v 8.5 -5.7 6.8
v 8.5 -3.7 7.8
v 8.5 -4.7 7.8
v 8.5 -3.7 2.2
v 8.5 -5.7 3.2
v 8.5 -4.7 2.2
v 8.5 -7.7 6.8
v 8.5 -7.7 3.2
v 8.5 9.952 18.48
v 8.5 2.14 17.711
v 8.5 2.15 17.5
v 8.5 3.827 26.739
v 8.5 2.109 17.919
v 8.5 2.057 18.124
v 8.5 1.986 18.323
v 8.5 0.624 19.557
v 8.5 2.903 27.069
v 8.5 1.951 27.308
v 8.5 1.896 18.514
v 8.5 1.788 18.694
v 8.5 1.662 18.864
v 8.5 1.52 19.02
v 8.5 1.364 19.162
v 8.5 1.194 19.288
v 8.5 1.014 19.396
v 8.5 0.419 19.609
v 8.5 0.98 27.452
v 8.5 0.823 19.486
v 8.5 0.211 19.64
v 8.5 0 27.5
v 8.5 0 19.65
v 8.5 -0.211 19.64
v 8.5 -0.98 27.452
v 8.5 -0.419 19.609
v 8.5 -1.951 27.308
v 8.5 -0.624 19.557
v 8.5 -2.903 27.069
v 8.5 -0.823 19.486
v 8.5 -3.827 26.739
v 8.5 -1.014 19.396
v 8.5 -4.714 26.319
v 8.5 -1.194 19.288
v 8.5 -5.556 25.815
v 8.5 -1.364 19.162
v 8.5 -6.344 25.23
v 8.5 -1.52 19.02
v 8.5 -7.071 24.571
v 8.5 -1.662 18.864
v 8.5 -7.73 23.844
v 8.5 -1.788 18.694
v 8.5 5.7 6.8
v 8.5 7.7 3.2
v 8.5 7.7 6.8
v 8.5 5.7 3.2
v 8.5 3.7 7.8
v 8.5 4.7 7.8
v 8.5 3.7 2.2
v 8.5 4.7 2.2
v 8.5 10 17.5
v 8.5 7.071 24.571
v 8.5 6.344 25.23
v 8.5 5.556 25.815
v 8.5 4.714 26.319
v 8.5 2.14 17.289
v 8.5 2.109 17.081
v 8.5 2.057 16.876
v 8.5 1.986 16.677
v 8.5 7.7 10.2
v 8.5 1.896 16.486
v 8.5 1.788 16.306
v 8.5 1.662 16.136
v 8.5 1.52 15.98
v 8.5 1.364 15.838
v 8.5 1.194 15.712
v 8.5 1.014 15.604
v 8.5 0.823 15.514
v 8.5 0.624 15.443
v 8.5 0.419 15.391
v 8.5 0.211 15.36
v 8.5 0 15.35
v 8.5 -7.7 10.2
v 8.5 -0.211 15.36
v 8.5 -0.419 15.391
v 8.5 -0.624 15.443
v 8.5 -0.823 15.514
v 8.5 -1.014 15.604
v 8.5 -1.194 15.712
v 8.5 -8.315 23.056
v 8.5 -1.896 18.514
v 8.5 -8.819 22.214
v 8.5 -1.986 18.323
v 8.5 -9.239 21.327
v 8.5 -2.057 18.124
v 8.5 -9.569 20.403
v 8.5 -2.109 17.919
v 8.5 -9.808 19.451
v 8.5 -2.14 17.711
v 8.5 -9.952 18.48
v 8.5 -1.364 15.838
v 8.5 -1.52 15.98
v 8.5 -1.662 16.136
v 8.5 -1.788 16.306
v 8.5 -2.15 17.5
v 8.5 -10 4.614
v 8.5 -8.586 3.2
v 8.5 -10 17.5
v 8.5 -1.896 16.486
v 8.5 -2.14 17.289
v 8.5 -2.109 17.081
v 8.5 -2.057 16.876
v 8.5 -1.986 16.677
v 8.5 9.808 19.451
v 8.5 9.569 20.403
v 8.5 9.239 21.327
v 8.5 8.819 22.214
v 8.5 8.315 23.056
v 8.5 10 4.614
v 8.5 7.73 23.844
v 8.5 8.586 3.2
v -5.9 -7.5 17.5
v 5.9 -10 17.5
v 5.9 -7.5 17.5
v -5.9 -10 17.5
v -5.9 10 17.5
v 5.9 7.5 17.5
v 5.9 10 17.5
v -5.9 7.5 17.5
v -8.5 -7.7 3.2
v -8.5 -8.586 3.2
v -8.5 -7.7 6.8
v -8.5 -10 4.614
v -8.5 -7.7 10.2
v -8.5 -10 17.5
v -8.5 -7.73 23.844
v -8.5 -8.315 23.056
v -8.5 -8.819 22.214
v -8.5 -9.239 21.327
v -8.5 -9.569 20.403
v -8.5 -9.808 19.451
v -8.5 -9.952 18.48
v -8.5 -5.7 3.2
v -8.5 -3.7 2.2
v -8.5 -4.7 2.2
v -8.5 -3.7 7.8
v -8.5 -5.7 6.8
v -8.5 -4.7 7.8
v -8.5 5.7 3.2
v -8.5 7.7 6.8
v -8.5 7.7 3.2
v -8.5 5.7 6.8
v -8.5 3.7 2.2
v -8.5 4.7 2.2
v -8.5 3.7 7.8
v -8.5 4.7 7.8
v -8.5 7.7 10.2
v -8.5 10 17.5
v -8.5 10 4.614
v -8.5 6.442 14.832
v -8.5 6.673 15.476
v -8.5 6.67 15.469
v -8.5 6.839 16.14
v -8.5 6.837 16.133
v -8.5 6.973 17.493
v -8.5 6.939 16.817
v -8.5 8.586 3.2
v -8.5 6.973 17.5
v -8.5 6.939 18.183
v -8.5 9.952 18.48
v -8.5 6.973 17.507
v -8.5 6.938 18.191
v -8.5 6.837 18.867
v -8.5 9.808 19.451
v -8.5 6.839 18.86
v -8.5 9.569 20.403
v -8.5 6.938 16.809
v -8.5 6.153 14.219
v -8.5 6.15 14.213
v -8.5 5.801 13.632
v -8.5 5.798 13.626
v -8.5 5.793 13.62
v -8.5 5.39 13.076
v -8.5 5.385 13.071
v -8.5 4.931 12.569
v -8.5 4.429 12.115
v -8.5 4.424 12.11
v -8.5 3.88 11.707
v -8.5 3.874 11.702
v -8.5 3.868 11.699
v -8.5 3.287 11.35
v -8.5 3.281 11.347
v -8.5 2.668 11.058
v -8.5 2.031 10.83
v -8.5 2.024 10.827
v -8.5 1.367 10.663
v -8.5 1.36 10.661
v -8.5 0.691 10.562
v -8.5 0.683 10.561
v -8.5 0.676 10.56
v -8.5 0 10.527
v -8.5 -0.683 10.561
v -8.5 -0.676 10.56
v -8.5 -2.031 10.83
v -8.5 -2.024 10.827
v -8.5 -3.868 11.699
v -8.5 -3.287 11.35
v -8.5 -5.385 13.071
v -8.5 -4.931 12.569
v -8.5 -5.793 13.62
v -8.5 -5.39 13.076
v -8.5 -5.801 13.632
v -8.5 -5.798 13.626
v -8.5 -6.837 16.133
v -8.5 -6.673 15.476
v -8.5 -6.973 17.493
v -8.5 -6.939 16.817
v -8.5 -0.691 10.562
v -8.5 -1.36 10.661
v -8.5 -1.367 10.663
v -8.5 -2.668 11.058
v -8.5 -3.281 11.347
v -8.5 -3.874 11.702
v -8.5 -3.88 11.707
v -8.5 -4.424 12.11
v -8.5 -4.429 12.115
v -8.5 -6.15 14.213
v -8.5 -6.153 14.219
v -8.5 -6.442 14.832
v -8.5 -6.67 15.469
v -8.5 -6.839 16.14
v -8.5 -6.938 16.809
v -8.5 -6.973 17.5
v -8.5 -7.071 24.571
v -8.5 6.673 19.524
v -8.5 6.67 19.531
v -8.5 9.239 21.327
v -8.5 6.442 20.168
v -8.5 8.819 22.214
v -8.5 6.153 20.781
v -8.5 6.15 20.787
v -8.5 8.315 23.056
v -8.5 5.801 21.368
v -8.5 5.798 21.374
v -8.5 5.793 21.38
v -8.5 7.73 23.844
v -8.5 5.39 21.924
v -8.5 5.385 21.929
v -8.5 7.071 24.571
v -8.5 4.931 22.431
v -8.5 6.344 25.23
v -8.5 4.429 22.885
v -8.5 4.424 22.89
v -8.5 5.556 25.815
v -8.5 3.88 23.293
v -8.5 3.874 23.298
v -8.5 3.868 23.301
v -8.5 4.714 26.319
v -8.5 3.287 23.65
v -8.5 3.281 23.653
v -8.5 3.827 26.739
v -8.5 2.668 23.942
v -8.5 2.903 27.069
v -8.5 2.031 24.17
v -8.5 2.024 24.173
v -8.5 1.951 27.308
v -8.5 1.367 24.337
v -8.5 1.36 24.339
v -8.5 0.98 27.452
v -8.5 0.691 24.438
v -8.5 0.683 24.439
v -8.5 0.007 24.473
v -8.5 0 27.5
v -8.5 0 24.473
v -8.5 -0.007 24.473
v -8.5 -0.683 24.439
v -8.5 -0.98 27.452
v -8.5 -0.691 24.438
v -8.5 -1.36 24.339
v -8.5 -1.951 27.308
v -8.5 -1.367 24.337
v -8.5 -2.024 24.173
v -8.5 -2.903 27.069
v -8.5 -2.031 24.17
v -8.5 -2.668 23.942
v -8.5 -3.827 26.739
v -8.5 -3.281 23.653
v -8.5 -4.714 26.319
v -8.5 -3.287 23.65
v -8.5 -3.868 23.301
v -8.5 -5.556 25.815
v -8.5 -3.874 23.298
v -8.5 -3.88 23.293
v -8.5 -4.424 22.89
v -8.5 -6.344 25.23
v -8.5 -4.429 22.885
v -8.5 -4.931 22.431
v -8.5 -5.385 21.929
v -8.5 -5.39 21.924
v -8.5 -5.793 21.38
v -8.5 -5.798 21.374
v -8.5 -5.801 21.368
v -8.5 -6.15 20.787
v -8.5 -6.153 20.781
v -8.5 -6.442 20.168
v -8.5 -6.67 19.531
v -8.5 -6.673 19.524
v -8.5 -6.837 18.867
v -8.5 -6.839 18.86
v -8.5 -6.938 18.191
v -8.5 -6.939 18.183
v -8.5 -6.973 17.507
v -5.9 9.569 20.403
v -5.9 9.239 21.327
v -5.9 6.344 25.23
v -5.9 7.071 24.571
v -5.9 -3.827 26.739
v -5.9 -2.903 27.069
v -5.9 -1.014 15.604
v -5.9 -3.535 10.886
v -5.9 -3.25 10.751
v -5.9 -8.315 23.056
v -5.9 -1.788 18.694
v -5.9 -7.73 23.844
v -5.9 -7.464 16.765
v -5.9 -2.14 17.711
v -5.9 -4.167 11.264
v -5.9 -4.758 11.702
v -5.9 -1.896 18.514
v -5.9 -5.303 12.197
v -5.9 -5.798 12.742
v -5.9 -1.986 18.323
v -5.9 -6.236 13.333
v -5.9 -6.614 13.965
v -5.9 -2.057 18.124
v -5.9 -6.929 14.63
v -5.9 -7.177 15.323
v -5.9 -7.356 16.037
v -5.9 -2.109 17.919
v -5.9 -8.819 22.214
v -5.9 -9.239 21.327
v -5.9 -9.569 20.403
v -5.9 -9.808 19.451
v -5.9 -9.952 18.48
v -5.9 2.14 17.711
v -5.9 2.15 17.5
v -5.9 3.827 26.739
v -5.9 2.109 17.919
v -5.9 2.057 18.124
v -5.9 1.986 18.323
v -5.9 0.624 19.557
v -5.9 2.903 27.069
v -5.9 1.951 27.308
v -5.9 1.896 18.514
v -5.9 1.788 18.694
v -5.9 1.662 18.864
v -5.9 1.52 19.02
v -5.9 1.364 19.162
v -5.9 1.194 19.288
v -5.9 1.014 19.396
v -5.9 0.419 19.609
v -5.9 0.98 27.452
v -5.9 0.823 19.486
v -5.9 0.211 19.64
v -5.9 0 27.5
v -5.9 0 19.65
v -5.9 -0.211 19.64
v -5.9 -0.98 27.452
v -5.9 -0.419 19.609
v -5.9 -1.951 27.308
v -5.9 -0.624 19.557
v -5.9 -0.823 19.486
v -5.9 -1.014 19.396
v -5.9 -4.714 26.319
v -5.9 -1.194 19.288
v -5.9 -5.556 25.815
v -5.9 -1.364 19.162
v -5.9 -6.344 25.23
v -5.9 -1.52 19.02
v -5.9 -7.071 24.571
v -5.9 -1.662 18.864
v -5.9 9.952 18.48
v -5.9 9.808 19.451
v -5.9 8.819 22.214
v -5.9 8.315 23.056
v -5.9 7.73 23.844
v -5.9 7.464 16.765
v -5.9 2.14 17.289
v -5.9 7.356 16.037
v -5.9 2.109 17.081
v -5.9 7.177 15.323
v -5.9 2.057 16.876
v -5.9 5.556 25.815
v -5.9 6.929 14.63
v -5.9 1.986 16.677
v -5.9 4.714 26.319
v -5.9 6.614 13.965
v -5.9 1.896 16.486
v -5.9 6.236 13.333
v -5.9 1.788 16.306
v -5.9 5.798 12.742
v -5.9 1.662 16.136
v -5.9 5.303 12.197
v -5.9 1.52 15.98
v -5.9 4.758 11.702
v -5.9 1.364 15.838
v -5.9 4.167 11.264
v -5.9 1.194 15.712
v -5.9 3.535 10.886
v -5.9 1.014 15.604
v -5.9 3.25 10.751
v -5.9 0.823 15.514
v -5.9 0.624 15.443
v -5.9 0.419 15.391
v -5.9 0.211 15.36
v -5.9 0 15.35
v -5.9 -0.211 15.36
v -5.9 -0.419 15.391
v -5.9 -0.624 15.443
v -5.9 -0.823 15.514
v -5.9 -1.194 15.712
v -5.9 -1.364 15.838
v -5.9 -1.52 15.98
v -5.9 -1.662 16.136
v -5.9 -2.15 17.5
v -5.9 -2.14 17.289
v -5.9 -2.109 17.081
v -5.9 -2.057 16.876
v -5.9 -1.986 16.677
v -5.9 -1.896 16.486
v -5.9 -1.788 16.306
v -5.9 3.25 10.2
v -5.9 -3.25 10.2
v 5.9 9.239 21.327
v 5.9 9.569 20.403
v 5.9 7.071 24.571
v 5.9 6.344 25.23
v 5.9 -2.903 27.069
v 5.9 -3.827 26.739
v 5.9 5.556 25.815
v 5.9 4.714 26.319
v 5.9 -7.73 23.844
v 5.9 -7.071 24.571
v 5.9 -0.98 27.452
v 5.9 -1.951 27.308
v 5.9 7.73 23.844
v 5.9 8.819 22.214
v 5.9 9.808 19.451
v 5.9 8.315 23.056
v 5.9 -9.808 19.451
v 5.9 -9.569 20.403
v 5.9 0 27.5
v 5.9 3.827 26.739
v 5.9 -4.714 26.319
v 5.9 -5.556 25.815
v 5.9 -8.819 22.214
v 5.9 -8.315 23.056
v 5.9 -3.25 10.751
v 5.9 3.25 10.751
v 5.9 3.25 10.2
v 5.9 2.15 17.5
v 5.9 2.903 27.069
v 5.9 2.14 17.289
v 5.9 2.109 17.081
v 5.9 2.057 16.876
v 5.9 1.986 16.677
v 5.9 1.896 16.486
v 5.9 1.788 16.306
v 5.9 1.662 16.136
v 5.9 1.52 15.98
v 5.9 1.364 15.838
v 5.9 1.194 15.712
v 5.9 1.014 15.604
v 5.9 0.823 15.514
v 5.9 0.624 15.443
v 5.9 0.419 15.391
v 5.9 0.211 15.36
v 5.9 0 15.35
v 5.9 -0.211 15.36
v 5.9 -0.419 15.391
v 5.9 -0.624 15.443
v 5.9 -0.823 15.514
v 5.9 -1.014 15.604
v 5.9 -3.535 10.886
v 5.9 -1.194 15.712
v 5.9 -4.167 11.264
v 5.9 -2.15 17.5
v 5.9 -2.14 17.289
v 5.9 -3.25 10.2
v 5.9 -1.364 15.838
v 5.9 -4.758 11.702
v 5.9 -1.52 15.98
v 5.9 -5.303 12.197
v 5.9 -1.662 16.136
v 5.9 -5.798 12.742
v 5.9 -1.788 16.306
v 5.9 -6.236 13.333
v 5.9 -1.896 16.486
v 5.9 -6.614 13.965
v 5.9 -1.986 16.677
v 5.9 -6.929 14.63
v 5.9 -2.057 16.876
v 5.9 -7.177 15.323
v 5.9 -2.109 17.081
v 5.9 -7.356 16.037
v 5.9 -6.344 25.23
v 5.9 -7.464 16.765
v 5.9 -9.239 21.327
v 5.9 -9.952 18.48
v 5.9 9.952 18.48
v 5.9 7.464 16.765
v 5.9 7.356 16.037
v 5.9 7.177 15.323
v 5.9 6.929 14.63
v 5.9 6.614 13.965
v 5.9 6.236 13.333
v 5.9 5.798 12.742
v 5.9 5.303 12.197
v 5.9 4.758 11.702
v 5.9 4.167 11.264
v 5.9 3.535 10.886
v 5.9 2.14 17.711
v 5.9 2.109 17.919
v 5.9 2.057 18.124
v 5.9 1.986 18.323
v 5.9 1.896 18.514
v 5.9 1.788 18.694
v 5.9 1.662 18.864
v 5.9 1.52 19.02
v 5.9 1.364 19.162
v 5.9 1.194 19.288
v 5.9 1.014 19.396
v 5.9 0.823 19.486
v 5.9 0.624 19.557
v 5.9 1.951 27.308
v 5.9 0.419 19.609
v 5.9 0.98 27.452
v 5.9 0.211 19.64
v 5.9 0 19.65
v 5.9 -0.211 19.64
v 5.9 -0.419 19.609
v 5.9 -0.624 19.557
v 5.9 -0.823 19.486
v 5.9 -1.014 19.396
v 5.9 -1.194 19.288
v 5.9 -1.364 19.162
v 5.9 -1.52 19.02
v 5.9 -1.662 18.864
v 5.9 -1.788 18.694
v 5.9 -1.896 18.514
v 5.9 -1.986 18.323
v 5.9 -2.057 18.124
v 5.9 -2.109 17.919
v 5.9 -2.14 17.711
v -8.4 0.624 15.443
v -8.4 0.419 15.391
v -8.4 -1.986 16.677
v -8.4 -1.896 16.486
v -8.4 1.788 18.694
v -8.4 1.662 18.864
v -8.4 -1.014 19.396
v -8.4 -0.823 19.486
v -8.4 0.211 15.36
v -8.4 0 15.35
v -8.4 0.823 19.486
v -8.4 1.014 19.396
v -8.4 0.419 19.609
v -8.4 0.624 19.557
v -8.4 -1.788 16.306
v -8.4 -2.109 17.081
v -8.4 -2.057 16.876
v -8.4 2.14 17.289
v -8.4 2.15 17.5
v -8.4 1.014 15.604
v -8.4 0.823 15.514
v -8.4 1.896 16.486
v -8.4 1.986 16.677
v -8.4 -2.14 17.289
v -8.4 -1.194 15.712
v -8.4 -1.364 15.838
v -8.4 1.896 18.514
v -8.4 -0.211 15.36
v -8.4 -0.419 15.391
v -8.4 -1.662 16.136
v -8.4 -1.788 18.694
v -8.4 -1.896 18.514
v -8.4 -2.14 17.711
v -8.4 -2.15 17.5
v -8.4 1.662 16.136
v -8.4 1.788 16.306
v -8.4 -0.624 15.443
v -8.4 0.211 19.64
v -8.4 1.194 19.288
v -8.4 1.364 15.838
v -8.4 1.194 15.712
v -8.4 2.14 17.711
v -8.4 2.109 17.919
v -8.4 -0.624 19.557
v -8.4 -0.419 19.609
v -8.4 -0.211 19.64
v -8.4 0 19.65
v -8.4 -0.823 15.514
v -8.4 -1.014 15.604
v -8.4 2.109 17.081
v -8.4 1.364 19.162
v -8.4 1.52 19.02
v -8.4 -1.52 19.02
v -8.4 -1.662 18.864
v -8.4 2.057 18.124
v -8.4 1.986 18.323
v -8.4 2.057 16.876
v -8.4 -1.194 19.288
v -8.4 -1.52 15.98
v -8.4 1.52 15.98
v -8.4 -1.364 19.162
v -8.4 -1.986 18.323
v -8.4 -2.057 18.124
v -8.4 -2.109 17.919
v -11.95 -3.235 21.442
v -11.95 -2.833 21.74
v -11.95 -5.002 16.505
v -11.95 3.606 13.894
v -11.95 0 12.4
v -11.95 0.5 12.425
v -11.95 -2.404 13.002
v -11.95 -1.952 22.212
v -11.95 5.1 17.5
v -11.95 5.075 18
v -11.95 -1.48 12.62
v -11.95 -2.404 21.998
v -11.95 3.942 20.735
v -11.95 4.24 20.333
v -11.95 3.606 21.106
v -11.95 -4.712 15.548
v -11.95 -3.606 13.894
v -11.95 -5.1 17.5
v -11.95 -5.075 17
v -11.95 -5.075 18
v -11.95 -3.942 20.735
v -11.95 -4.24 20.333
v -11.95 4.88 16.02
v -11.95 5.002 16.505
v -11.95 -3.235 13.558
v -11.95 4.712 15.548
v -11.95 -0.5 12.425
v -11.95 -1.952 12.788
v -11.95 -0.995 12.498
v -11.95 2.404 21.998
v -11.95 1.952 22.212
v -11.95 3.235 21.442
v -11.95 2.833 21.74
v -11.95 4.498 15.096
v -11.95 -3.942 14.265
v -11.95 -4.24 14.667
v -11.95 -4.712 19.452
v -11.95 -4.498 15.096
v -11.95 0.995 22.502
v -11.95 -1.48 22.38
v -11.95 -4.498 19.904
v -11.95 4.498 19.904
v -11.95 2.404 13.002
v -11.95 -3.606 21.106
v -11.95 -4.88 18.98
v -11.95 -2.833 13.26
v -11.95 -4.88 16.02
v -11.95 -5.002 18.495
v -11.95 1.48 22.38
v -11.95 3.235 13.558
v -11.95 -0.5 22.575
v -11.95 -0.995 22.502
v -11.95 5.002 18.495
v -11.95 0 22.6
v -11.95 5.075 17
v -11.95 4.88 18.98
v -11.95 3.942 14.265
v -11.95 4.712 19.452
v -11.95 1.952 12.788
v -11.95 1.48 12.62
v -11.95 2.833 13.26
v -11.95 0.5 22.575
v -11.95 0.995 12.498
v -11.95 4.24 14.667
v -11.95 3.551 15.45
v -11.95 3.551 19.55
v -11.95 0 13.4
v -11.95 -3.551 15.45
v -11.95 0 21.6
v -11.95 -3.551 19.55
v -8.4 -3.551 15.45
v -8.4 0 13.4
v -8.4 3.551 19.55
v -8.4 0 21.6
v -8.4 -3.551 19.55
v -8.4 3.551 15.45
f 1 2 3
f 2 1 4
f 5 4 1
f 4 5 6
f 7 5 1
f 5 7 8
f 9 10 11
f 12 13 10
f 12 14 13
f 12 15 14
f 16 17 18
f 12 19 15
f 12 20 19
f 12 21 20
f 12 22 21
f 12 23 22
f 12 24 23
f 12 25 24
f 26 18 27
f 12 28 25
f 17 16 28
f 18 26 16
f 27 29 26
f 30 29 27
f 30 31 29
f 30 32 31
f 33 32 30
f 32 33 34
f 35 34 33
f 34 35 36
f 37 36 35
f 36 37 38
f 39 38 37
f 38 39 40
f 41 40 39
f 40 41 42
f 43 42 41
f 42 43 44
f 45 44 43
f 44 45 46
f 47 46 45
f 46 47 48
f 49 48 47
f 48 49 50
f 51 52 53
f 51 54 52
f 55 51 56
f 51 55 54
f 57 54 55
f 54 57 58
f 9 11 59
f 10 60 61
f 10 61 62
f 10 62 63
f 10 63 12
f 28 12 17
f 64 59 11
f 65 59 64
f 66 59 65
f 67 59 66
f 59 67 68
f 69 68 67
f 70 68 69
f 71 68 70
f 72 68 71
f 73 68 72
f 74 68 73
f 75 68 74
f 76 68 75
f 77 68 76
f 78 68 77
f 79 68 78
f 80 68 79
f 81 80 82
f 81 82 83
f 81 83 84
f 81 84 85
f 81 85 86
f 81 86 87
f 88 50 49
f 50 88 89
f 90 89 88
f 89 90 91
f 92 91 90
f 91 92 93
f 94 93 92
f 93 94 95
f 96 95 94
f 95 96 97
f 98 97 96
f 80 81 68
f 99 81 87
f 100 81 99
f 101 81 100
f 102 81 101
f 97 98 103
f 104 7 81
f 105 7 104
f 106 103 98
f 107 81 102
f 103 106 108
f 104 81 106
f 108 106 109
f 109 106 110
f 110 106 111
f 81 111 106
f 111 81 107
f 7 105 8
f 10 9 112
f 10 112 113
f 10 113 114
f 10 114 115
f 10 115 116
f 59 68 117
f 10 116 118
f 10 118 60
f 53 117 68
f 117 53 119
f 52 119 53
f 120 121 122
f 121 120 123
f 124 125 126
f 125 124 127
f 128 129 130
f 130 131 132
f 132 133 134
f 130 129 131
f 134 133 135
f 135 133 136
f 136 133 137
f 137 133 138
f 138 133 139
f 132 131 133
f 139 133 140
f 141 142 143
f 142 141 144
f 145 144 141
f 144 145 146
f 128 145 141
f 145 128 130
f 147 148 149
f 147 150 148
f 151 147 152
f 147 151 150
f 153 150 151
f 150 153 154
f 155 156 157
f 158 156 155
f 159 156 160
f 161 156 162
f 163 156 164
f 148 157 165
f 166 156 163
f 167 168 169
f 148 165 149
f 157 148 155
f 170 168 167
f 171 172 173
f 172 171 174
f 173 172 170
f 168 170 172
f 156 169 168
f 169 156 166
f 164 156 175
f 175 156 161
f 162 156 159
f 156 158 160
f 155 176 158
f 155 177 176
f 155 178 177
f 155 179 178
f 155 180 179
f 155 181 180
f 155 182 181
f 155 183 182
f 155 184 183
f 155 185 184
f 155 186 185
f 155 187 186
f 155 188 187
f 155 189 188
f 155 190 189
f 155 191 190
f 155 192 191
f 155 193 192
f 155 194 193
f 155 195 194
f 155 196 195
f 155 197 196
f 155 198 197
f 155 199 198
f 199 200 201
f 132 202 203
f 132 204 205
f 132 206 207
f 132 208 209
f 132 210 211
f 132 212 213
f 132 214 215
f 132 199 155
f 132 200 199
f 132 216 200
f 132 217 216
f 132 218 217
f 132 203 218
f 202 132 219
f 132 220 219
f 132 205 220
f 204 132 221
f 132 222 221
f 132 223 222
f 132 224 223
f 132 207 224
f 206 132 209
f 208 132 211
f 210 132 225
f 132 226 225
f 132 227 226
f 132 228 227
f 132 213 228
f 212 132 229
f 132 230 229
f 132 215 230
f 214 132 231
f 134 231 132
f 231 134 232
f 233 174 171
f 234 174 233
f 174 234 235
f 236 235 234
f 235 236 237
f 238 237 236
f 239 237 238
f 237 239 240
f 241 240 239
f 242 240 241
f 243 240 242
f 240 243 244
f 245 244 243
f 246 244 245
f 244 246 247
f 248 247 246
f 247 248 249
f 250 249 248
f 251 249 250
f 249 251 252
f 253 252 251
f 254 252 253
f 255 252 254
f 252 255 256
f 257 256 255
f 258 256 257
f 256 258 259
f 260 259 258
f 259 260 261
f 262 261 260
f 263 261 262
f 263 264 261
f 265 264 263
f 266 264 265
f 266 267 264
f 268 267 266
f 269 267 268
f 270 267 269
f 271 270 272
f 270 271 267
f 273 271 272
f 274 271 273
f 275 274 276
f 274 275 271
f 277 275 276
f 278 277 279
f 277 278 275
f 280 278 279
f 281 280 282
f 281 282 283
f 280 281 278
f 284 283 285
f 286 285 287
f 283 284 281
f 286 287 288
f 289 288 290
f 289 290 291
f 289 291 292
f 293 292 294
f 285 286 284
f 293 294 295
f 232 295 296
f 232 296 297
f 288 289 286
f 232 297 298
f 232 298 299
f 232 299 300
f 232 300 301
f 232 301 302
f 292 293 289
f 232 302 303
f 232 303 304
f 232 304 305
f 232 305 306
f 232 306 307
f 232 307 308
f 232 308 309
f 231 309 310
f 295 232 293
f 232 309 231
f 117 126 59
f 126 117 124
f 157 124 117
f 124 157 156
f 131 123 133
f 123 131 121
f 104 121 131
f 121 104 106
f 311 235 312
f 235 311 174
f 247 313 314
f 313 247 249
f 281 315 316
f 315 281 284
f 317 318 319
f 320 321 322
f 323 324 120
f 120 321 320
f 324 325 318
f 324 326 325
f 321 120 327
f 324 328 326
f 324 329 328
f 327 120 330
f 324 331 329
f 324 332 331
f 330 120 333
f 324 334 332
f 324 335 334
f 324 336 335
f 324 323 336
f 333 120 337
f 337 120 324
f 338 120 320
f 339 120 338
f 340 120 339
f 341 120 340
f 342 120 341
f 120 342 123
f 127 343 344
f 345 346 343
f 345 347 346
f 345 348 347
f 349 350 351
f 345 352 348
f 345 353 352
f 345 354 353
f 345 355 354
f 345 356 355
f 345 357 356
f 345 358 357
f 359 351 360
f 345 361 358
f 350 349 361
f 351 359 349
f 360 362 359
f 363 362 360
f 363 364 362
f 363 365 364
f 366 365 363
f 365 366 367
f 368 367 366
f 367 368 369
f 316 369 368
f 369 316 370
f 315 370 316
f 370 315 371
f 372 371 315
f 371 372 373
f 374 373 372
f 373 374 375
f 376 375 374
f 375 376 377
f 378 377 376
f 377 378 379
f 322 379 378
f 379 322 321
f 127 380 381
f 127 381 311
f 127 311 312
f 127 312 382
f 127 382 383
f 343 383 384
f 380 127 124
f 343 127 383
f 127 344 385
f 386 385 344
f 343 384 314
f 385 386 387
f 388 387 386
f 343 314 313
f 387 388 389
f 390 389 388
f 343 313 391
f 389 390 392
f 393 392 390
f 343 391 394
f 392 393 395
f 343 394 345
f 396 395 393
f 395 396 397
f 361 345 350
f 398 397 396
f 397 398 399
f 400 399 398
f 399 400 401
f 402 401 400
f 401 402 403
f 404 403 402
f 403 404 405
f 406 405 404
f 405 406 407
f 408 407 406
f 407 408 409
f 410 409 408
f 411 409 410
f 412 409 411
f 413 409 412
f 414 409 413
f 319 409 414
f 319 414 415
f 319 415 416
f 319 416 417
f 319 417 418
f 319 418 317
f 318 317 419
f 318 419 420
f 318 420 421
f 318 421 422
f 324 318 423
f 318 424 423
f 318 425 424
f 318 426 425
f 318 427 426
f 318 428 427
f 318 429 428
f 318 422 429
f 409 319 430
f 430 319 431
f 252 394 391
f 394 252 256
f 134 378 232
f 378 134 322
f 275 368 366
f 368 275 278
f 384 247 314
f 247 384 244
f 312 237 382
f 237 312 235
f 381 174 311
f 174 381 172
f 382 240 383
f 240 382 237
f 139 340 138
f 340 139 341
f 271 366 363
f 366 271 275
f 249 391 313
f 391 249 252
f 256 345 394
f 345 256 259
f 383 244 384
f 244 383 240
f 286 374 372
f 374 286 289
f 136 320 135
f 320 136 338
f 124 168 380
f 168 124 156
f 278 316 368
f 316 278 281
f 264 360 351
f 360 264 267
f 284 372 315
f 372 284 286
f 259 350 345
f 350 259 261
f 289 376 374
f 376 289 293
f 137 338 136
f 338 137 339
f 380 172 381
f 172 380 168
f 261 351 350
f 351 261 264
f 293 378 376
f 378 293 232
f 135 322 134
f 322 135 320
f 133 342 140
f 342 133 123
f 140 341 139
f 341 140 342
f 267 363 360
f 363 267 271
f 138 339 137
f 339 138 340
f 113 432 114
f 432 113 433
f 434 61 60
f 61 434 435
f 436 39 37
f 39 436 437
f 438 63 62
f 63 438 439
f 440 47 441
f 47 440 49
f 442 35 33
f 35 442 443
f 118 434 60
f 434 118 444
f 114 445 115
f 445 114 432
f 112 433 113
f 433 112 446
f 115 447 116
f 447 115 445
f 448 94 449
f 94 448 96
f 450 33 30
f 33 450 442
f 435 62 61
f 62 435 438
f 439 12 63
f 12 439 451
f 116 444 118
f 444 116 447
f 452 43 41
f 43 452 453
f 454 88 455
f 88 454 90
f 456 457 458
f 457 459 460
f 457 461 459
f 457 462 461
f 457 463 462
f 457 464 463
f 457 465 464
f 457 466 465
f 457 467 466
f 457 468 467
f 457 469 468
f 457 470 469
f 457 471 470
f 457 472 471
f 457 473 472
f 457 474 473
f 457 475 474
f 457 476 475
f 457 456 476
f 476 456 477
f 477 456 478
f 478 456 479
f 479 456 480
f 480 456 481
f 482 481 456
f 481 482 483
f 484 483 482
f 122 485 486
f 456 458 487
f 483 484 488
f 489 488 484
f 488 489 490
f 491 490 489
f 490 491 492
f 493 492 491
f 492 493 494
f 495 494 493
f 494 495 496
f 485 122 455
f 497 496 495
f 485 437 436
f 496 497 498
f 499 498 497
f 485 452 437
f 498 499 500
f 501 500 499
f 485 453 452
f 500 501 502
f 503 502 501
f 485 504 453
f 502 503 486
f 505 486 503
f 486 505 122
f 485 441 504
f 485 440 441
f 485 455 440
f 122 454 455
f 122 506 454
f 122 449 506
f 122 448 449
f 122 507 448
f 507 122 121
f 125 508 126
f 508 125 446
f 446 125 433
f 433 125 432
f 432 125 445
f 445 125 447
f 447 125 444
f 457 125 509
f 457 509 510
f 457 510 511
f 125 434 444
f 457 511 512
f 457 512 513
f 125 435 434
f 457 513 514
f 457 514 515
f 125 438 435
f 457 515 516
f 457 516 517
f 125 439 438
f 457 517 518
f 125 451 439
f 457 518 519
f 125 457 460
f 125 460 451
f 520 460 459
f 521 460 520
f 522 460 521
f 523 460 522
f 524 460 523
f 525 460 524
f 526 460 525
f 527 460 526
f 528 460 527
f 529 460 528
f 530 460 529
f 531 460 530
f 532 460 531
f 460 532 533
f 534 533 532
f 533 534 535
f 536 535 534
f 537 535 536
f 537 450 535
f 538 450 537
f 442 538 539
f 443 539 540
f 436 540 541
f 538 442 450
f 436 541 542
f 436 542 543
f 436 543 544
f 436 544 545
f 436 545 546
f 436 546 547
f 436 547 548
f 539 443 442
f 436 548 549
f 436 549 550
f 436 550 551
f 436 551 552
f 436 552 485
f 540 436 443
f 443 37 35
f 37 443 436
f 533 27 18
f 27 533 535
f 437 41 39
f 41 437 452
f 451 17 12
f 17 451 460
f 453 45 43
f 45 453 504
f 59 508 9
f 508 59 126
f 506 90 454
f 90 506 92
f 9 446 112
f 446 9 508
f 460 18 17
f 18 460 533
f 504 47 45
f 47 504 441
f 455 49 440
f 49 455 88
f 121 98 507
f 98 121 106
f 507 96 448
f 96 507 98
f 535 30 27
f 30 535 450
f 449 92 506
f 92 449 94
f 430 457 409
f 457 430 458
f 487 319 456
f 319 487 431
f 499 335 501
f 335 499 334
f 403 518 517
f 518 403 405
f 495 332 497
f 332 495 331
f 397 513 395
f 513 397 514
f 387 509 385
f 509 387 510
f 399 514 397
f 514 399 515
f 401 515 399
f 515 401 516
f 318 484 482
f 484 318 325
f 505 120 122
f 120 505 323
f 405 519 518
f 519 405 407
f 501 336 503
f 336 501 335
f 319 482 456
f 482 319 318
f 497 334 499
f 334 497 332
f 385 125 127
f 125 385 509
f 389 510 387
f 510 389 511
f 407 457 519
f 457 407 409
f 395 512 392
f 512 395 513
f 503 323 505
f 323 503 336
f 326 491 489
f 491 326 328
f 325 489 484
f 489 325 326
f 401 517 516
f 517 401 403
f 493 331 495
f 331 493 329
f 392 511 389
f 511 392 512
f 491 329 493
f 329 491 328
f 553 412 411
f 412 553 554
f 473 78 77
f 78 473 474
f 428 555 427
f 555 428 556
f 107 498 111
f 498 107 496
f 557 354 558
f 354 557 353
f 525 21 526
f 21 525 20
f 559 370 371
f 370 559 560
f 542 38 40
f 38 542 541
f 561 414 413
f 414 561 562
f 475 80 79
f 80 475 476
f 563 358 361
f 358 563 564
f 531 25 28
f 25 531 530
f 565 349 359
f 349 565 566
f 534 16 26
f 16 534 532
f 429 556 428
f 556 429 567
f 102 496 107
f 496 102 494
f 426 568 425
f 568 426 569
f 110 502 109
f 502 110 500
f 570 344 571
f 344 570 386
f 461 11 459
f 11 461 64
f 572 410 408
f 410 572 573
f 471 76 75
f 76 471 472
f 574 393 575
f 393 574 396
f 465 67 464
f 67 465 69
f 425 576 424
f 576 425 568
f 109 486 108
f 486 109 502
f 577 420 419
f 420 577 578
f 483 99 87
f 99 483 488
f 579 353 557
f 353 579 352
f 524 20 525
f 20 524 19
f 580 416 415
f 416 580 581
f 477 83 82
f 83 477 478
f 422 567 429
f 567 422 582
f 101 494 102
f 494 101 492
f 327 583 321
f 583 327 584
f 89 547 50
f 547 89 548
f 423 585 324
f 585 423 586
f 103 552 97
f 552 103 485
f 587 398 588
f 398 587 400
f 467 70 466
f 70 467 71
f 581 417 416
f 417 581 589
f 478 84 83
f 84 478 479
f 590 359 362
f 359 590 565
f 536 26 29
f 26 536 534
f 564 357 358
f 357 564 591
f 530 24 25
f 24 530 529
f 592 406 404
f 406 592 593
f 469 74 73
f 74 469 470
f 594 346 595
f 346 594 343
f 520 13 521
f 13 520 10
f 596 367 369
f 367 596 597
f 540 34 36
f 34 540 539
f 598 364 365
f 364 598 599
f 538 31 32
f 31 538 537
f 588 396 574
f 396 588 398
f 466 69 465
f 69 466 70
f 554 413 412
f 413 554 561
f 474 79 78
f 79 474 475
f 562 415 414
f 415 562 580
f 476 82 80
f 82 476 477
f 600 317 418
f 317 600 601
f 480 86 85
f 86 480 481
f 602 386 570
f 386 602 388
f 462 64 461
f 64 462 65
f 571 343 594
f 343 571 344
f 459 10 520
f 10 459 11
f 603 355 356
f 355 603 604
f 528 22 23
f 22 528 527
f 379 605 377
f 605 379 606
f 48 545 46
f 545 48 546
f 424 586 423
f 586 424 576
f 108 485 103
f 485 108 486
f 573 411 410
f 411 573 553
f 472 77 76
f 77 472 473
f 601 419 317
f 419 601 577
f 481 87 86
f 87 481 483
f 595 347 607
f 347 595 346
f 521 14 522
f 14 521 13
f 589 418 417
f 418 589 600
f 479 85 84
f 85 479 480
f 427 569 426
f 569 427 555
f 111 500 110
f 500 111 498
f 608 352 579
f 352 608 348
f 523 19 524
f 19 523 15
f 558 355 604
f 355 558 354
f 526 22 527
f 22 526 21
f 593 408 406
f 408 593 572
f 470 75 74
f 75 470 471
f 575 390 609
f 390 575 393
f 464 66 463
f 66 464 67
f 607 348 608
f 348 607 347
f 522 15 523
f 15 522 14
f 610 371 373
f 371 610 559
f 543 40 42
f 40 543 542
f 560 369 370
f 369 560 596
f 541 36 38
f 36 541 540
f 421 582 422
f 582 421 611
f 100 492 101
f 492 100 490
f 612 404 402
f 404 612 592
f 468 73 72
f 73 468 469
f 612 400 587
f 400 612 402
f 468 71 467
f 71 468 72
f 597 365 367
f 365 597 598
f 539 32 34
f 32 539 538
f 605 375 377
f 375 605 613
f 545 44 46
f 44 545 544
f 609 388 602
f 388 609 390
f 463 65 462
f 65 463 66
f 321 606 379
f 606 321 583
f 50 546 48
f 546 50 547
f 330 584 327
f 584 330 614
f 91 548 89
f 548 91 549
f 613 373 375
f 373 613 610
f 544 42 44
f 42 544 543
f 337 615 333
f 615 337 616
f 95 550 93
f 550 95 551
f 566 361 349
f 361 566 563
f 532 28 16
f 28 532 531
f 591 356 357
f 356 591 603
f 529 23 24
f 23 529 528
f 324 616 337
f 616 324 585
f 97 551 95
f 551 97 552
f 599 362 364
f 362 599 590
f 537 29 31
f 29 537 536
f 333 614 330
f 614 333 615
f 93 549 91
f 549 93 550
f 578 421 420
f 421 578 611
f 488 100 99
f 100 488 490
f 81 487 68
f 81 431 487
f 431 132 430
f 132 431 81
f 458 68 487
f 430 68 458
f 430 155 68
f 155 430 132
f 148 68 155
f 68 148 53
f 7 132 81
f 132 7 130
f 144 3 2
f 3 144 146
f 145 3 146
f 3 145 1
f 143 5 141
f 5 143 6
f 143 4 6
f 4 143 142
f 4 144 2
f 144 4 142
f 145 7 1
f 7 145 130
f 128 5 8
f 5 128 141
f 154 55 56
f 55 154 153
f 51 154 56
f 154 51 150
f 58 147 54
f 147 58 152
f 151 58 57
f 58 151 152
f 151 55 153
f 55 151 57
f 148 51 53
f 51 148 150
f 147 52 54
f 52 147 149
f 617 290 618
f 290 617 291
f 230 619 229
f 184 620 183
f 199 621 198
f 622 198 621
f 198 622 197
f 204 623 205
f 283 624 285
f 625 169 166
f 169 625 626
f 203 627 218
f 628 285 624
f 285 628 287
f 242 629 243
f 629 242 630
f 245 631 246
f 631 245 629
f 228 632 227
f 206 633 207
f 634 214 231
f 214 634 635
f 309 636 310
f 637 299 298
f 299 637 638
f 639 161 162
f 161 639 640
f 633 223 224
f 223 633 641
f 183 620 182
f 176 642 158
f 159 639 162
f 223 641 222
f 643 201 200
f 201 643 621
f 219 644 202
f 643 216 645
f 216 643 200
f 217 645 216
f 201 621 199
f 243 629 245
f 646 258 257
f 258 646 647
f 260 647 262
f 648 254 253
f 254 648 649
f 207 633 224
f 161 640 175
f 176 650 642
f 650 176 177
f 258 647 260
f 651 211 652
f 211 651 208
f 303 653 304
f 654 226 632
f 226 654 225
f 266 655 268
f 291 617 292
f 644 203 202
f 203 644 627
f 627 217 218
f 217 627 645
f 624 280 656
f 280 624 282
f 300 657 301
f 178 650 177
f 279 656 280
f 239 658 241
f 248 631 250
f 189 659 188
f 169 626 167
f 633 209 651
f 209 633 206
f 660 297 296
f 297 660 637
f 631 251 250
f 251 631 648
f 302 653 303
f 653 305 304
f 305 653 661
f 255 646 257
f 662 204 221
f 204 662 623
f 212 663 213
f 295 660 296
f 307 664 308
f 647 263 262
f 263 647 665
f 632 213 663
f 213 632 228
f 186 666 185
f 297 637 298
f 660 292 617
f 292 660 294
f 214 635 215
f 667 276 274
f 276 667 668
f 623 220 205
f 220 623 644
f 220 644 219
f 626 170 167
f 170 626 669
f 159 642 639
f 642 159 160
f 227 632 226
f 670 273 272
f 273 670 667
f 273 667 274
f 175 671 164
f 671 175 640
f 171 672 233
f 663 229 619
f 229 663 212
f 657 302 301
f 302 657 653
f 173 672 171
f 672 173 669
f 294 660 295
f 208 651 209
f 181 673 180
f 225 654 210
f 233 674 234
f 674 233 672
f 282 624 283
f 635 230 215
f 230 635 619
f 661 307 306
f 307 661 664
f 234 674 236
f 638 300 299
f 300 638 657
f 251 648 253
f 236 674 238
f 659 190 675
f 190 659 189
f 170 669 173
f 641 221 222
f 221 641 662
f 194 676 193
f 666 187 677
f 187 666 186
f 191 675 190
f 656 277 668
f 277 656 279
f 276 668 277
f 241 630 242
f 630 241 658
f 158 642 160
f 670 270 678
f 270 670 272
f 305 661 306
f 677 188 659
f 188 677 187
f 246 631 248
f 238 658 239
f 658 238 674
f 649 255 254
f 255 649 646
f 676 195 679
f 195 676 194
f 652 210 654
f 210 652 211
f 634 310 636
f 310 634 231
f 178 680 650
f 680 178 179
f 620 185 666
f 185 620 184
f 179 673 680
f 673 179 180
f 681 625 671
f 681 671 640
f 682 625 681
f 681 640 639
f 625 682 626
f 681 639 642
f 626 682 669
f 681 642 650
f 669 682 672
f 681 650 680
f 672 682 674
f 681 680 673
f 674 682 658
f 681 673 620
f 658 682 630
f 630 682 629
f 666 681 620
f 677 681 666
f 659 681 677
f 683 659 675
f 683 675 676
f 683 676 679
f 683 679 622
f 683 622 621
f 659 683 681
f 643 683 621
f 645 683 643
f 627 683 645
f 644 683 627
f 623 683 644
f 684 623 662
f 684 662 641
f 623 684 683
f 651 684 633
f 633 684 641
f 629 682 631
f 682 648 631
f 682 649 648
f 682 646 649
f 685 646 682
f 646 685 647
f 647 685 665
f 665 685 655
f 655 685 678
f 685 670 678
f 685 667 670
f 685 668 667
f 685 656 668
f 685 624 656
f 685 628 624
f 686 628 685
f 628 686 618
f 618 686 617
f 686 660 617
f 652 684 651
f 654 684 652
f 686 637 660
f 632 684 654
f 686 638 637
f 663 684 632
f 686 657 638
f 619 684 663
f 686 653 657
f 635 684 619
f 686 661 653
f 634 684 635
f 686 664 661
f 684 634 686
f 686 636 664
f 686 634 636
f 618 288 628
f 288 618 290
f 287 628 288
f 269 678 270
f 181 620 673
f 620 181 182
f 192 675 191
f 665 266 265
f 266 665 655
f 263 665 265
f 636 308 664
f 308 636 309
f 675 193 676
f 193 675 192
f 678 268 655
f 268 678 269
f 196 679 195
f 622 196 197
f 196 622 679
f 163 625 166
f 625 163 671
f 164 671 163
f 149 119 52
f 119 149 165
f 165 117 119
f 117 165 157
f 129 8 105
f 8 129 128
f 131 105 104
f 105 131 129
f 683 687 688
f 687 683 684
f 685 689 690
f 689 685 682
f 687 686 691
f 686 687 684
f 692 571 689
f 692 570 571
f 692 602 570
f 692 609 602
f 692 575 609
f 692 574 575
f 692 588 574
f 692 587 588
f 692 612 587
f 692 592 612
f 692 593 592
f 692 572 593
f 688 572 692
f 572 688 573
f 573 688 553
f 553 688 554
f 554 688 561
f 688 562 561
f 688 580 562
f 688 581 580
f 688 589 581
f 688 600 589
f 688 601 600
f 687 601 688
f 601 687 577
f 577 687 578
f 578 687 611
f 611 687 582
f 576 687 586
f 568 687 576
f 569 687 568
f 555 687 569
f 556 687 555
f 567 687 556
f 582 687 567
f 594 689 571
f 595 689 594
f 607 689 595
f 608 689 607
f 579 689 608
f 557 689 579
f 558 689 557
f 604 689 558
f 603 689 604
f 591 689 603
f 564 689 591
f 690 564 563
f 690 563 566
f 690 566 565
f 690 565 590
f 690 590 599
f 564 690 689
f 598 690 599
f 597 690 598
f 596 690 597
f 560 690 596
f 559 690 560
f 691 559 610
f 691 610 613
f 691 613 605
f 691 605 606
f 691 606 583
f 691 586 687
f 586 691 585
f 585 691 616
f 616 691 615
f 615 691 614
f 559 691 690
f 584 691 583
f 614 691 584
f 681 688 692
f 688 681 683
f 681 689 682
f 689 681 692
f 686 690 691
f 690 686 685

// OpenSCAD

// (C) Radus Linuxbashev 2015
// http://vk.com/linuxbashev

lay=0.2;

m4d=4+0.3;
m4nd = 7.8+0.4;
m4nh=3.4;
m4shd=8.9+0.7;


x=70;				// x length
y=130;			//	y length

bwx=60;			// spool height between sliders
bwy=110;			//	Y length beetween rails

z=3;				// height of base
ry=15;			// rail width

wx=15;			// base part size
wz=10;			// rail height

w=2;


slx=12+5;			// spool rollers X size
slx1=5+5+0.9+0.9;	// roller bearing height with washings

d1=13;		// diameter roller bearings
d2=20;		// diameter flange rollers
d3=d2;		// diameter flange rollers2

dk=205;

osz=wz+1+d1/2;

z2=13;

pw=1;
pw1=1;
py=4;
pph1=wz-4;
pph2=wz-6;

fs=2;

$fn=64;

//---------------------------
module paz(px, ppy, pz, ph) {
difference() {
union() {
hull() {
translate([0,ppy-pw-pw1/2,0]) cube([px, pw1, ph], true);
translate([0,ppy-pw/2,0]) cube([px, pw, pz], true);
} // hl
translate([0,ppy/2-ppy/4,0]) cube([px, ppy, ph], true);
} // un

} // df
} // mod paz;


module sph() {
difference() {
union() {
for (mx=[0,1]) mirror([mx,0,0])
translate([-x/2, 0, z/2]) cube([wx, y, z], true);

for (my=[0,1]) mirror([0,my,0])
for (mx=[0,1]) mirror([mx,0,0])
translate([-x/2, -y/2, z/2]) cylinder(z, wx/2, wx/2, true);

for (my=[0,1]) mirror([0,my,0])
translate([0,bwy/2, (wz+z)/2]) cube([x+wx, ry, wz+z], true);

} // un

for (myy=[0,1]) mirror([0,myy,0])
translate([0,bwy/2,0])
for (my=[0,1]) mirror([0,my,0])
translate([0,-ry/2,z+wz/2]) paz(x+wx+1, py, pph1, pph2);

for (mx=[0,1]) mirror([mx,0,0])
for (my=[0,1]) mirror([0,my,0])
translate([0,-bwy/2,0])
for (myy=[0,1]) mirror([0,myy,0])
translate([-x/2-wx/2, -ry/2, z+wz/2+0.1]) rotate([0,0,45]) cube([fs, fs, wz+0.2], true);

} // df
} // mod sph


module spsl() {
difference() {
union() {
translate([0,0,osz/2]) cube([slx, d2, osz], true);
translate([-slx/2+(slx-slx1)/4,0,osz]) rotate([0,90,0]) cylinder((slx-slx1)/2, d3/2, d3/2, true);

translate([+slx/2-(slx-slx1)/4,0,osz]) rotate([0,90,0]) cylinder((slx-slx1)/2, d3/2, d3/2, true);
} // un

%translate([0,0,osz]) rotate([0,90,0]) cylinder(slx1, d1/2, d1/2, true);


translate([0,0,osz+d2/2]) cube([slx1, d2+1, d2], true);

translate([0,0,osz-d1/2]) cube([slx1, d1/2, d1], true);

translate([0,0,osz]) rotate([0,90,0]) cylinder(slx1, d1/2+1, d1/2+1, true);

translate([0,0,osz]) rotate([0,90,0]) cylinder(slx+1, m4d/2, m4d/2, true);


translate([0,0,wz/2]) cube([slx+1, ry+lay*2, wz+lay*2], true);
} // df
} // mod spsl

module spsl1() {
difference() {
union() {
spsl();
translate([-slx/2-m4nh/2, 0, osz]) rotate([0,90,0]) cylinder(m4nh+0.1, m4nd/2+1, d3/2-3, true);

for (my=[0,1]) mirror([0,my,0])
translate([0,-ry/2,wz/2]) paz(slx, py-lay, pph1-lay*2, pph2-lay*2);

} // un

translate([-slx/2-m4nh, 0, osz]) rotate([0,90,0]) cylinder(m4nh*2+0.2, m4nd/2, m4nd/2, true, $fn=6);

for (my=[0,1]) mirror([0,my,0]) {
translate([-slx/2-1,d2/2-(d2-ry)+1.5,(wz-pph2+lay*2)/2]) mirror([0,0,1]) cube([slx+2, (d2-ry), wz]);
translate([0,d2/2,(wz-pph2+lay*2)/2]) rotate([45,0,0]) cube([slx+1, fs, fs], true);
} // for

//translate([slx/2,0,osz]) rotate([45,0,0]) translate([0,d2/2+d1/2,0]) cube([slx, d2, d2], true);

} // df
} // mod spsl1


module spsl22() {
difference() {
union() {
translate([0,0,z2/2]) cube([slx, d2, z2], true);

for (my=[0,1]) mirror([0,my,0]) {
translate([0,-d2/2,z2+w]) rotate([-90,0,0]) cylinder((d2-ry)/2, slx/2, slx/2);
translate([0,-d2/2+((d2-ry)/2)/2,z2]) cube([slx, (d2-ry)/2, w*2], true);
} // for

} // un

translate([0,0,z2+w]) rotate([-90,0,0]) cylinder(d2+1, 2.5/2, 2.5/2, $fn=8, true);

translate([0,0,wz/2]) cube([slx+1, ry+lay*2, wz+lay*4], true);




} // df
} // mod spsl

module spsl2() {
difference() {
union() {
spsl22();

for (my=[0,1]) mirror([0,my,0])
translate([0,-ry/2,wz/2]) paz(slx, py-lay, pph1-lay*2, pph2-lay*2);

} // un


for (my=[0,1]) mirror([0,my,0]) {
translate([-slx/2-1,d2/2-(d2-ry)+1.5,(wz-pph2+lay*2)/2]) mirror([0,0,1]) cube([slx+2, (d2-ry), wz]);
translate([0,d2/2,(wz-pph2+lay*2)/2]) rotate([45,0,0]) cube([slx+1, fs, fs], true);
} // for

//translate([slx/2,0,osz]) rotate([45,0,0]) translate([0,d2/2+d1/2,0]) cube([slx, d2, d2], true);

} // df
} // mod spsl2



// ---------------------------

//%translate([0,0,dk/2+12]) rotate([0,90,0]) cylinder(bwx, dk/2, dk/2, true);

//sph();

//for (my=[0,1]) mirror([0,my,0])
//for (mx=[0,1]) mirror([mx,0,0])
//translate([-bwx/2, -bwy/2, z])
spsl1();

//translate([0, -bwy/2, z])
//spsl2();

